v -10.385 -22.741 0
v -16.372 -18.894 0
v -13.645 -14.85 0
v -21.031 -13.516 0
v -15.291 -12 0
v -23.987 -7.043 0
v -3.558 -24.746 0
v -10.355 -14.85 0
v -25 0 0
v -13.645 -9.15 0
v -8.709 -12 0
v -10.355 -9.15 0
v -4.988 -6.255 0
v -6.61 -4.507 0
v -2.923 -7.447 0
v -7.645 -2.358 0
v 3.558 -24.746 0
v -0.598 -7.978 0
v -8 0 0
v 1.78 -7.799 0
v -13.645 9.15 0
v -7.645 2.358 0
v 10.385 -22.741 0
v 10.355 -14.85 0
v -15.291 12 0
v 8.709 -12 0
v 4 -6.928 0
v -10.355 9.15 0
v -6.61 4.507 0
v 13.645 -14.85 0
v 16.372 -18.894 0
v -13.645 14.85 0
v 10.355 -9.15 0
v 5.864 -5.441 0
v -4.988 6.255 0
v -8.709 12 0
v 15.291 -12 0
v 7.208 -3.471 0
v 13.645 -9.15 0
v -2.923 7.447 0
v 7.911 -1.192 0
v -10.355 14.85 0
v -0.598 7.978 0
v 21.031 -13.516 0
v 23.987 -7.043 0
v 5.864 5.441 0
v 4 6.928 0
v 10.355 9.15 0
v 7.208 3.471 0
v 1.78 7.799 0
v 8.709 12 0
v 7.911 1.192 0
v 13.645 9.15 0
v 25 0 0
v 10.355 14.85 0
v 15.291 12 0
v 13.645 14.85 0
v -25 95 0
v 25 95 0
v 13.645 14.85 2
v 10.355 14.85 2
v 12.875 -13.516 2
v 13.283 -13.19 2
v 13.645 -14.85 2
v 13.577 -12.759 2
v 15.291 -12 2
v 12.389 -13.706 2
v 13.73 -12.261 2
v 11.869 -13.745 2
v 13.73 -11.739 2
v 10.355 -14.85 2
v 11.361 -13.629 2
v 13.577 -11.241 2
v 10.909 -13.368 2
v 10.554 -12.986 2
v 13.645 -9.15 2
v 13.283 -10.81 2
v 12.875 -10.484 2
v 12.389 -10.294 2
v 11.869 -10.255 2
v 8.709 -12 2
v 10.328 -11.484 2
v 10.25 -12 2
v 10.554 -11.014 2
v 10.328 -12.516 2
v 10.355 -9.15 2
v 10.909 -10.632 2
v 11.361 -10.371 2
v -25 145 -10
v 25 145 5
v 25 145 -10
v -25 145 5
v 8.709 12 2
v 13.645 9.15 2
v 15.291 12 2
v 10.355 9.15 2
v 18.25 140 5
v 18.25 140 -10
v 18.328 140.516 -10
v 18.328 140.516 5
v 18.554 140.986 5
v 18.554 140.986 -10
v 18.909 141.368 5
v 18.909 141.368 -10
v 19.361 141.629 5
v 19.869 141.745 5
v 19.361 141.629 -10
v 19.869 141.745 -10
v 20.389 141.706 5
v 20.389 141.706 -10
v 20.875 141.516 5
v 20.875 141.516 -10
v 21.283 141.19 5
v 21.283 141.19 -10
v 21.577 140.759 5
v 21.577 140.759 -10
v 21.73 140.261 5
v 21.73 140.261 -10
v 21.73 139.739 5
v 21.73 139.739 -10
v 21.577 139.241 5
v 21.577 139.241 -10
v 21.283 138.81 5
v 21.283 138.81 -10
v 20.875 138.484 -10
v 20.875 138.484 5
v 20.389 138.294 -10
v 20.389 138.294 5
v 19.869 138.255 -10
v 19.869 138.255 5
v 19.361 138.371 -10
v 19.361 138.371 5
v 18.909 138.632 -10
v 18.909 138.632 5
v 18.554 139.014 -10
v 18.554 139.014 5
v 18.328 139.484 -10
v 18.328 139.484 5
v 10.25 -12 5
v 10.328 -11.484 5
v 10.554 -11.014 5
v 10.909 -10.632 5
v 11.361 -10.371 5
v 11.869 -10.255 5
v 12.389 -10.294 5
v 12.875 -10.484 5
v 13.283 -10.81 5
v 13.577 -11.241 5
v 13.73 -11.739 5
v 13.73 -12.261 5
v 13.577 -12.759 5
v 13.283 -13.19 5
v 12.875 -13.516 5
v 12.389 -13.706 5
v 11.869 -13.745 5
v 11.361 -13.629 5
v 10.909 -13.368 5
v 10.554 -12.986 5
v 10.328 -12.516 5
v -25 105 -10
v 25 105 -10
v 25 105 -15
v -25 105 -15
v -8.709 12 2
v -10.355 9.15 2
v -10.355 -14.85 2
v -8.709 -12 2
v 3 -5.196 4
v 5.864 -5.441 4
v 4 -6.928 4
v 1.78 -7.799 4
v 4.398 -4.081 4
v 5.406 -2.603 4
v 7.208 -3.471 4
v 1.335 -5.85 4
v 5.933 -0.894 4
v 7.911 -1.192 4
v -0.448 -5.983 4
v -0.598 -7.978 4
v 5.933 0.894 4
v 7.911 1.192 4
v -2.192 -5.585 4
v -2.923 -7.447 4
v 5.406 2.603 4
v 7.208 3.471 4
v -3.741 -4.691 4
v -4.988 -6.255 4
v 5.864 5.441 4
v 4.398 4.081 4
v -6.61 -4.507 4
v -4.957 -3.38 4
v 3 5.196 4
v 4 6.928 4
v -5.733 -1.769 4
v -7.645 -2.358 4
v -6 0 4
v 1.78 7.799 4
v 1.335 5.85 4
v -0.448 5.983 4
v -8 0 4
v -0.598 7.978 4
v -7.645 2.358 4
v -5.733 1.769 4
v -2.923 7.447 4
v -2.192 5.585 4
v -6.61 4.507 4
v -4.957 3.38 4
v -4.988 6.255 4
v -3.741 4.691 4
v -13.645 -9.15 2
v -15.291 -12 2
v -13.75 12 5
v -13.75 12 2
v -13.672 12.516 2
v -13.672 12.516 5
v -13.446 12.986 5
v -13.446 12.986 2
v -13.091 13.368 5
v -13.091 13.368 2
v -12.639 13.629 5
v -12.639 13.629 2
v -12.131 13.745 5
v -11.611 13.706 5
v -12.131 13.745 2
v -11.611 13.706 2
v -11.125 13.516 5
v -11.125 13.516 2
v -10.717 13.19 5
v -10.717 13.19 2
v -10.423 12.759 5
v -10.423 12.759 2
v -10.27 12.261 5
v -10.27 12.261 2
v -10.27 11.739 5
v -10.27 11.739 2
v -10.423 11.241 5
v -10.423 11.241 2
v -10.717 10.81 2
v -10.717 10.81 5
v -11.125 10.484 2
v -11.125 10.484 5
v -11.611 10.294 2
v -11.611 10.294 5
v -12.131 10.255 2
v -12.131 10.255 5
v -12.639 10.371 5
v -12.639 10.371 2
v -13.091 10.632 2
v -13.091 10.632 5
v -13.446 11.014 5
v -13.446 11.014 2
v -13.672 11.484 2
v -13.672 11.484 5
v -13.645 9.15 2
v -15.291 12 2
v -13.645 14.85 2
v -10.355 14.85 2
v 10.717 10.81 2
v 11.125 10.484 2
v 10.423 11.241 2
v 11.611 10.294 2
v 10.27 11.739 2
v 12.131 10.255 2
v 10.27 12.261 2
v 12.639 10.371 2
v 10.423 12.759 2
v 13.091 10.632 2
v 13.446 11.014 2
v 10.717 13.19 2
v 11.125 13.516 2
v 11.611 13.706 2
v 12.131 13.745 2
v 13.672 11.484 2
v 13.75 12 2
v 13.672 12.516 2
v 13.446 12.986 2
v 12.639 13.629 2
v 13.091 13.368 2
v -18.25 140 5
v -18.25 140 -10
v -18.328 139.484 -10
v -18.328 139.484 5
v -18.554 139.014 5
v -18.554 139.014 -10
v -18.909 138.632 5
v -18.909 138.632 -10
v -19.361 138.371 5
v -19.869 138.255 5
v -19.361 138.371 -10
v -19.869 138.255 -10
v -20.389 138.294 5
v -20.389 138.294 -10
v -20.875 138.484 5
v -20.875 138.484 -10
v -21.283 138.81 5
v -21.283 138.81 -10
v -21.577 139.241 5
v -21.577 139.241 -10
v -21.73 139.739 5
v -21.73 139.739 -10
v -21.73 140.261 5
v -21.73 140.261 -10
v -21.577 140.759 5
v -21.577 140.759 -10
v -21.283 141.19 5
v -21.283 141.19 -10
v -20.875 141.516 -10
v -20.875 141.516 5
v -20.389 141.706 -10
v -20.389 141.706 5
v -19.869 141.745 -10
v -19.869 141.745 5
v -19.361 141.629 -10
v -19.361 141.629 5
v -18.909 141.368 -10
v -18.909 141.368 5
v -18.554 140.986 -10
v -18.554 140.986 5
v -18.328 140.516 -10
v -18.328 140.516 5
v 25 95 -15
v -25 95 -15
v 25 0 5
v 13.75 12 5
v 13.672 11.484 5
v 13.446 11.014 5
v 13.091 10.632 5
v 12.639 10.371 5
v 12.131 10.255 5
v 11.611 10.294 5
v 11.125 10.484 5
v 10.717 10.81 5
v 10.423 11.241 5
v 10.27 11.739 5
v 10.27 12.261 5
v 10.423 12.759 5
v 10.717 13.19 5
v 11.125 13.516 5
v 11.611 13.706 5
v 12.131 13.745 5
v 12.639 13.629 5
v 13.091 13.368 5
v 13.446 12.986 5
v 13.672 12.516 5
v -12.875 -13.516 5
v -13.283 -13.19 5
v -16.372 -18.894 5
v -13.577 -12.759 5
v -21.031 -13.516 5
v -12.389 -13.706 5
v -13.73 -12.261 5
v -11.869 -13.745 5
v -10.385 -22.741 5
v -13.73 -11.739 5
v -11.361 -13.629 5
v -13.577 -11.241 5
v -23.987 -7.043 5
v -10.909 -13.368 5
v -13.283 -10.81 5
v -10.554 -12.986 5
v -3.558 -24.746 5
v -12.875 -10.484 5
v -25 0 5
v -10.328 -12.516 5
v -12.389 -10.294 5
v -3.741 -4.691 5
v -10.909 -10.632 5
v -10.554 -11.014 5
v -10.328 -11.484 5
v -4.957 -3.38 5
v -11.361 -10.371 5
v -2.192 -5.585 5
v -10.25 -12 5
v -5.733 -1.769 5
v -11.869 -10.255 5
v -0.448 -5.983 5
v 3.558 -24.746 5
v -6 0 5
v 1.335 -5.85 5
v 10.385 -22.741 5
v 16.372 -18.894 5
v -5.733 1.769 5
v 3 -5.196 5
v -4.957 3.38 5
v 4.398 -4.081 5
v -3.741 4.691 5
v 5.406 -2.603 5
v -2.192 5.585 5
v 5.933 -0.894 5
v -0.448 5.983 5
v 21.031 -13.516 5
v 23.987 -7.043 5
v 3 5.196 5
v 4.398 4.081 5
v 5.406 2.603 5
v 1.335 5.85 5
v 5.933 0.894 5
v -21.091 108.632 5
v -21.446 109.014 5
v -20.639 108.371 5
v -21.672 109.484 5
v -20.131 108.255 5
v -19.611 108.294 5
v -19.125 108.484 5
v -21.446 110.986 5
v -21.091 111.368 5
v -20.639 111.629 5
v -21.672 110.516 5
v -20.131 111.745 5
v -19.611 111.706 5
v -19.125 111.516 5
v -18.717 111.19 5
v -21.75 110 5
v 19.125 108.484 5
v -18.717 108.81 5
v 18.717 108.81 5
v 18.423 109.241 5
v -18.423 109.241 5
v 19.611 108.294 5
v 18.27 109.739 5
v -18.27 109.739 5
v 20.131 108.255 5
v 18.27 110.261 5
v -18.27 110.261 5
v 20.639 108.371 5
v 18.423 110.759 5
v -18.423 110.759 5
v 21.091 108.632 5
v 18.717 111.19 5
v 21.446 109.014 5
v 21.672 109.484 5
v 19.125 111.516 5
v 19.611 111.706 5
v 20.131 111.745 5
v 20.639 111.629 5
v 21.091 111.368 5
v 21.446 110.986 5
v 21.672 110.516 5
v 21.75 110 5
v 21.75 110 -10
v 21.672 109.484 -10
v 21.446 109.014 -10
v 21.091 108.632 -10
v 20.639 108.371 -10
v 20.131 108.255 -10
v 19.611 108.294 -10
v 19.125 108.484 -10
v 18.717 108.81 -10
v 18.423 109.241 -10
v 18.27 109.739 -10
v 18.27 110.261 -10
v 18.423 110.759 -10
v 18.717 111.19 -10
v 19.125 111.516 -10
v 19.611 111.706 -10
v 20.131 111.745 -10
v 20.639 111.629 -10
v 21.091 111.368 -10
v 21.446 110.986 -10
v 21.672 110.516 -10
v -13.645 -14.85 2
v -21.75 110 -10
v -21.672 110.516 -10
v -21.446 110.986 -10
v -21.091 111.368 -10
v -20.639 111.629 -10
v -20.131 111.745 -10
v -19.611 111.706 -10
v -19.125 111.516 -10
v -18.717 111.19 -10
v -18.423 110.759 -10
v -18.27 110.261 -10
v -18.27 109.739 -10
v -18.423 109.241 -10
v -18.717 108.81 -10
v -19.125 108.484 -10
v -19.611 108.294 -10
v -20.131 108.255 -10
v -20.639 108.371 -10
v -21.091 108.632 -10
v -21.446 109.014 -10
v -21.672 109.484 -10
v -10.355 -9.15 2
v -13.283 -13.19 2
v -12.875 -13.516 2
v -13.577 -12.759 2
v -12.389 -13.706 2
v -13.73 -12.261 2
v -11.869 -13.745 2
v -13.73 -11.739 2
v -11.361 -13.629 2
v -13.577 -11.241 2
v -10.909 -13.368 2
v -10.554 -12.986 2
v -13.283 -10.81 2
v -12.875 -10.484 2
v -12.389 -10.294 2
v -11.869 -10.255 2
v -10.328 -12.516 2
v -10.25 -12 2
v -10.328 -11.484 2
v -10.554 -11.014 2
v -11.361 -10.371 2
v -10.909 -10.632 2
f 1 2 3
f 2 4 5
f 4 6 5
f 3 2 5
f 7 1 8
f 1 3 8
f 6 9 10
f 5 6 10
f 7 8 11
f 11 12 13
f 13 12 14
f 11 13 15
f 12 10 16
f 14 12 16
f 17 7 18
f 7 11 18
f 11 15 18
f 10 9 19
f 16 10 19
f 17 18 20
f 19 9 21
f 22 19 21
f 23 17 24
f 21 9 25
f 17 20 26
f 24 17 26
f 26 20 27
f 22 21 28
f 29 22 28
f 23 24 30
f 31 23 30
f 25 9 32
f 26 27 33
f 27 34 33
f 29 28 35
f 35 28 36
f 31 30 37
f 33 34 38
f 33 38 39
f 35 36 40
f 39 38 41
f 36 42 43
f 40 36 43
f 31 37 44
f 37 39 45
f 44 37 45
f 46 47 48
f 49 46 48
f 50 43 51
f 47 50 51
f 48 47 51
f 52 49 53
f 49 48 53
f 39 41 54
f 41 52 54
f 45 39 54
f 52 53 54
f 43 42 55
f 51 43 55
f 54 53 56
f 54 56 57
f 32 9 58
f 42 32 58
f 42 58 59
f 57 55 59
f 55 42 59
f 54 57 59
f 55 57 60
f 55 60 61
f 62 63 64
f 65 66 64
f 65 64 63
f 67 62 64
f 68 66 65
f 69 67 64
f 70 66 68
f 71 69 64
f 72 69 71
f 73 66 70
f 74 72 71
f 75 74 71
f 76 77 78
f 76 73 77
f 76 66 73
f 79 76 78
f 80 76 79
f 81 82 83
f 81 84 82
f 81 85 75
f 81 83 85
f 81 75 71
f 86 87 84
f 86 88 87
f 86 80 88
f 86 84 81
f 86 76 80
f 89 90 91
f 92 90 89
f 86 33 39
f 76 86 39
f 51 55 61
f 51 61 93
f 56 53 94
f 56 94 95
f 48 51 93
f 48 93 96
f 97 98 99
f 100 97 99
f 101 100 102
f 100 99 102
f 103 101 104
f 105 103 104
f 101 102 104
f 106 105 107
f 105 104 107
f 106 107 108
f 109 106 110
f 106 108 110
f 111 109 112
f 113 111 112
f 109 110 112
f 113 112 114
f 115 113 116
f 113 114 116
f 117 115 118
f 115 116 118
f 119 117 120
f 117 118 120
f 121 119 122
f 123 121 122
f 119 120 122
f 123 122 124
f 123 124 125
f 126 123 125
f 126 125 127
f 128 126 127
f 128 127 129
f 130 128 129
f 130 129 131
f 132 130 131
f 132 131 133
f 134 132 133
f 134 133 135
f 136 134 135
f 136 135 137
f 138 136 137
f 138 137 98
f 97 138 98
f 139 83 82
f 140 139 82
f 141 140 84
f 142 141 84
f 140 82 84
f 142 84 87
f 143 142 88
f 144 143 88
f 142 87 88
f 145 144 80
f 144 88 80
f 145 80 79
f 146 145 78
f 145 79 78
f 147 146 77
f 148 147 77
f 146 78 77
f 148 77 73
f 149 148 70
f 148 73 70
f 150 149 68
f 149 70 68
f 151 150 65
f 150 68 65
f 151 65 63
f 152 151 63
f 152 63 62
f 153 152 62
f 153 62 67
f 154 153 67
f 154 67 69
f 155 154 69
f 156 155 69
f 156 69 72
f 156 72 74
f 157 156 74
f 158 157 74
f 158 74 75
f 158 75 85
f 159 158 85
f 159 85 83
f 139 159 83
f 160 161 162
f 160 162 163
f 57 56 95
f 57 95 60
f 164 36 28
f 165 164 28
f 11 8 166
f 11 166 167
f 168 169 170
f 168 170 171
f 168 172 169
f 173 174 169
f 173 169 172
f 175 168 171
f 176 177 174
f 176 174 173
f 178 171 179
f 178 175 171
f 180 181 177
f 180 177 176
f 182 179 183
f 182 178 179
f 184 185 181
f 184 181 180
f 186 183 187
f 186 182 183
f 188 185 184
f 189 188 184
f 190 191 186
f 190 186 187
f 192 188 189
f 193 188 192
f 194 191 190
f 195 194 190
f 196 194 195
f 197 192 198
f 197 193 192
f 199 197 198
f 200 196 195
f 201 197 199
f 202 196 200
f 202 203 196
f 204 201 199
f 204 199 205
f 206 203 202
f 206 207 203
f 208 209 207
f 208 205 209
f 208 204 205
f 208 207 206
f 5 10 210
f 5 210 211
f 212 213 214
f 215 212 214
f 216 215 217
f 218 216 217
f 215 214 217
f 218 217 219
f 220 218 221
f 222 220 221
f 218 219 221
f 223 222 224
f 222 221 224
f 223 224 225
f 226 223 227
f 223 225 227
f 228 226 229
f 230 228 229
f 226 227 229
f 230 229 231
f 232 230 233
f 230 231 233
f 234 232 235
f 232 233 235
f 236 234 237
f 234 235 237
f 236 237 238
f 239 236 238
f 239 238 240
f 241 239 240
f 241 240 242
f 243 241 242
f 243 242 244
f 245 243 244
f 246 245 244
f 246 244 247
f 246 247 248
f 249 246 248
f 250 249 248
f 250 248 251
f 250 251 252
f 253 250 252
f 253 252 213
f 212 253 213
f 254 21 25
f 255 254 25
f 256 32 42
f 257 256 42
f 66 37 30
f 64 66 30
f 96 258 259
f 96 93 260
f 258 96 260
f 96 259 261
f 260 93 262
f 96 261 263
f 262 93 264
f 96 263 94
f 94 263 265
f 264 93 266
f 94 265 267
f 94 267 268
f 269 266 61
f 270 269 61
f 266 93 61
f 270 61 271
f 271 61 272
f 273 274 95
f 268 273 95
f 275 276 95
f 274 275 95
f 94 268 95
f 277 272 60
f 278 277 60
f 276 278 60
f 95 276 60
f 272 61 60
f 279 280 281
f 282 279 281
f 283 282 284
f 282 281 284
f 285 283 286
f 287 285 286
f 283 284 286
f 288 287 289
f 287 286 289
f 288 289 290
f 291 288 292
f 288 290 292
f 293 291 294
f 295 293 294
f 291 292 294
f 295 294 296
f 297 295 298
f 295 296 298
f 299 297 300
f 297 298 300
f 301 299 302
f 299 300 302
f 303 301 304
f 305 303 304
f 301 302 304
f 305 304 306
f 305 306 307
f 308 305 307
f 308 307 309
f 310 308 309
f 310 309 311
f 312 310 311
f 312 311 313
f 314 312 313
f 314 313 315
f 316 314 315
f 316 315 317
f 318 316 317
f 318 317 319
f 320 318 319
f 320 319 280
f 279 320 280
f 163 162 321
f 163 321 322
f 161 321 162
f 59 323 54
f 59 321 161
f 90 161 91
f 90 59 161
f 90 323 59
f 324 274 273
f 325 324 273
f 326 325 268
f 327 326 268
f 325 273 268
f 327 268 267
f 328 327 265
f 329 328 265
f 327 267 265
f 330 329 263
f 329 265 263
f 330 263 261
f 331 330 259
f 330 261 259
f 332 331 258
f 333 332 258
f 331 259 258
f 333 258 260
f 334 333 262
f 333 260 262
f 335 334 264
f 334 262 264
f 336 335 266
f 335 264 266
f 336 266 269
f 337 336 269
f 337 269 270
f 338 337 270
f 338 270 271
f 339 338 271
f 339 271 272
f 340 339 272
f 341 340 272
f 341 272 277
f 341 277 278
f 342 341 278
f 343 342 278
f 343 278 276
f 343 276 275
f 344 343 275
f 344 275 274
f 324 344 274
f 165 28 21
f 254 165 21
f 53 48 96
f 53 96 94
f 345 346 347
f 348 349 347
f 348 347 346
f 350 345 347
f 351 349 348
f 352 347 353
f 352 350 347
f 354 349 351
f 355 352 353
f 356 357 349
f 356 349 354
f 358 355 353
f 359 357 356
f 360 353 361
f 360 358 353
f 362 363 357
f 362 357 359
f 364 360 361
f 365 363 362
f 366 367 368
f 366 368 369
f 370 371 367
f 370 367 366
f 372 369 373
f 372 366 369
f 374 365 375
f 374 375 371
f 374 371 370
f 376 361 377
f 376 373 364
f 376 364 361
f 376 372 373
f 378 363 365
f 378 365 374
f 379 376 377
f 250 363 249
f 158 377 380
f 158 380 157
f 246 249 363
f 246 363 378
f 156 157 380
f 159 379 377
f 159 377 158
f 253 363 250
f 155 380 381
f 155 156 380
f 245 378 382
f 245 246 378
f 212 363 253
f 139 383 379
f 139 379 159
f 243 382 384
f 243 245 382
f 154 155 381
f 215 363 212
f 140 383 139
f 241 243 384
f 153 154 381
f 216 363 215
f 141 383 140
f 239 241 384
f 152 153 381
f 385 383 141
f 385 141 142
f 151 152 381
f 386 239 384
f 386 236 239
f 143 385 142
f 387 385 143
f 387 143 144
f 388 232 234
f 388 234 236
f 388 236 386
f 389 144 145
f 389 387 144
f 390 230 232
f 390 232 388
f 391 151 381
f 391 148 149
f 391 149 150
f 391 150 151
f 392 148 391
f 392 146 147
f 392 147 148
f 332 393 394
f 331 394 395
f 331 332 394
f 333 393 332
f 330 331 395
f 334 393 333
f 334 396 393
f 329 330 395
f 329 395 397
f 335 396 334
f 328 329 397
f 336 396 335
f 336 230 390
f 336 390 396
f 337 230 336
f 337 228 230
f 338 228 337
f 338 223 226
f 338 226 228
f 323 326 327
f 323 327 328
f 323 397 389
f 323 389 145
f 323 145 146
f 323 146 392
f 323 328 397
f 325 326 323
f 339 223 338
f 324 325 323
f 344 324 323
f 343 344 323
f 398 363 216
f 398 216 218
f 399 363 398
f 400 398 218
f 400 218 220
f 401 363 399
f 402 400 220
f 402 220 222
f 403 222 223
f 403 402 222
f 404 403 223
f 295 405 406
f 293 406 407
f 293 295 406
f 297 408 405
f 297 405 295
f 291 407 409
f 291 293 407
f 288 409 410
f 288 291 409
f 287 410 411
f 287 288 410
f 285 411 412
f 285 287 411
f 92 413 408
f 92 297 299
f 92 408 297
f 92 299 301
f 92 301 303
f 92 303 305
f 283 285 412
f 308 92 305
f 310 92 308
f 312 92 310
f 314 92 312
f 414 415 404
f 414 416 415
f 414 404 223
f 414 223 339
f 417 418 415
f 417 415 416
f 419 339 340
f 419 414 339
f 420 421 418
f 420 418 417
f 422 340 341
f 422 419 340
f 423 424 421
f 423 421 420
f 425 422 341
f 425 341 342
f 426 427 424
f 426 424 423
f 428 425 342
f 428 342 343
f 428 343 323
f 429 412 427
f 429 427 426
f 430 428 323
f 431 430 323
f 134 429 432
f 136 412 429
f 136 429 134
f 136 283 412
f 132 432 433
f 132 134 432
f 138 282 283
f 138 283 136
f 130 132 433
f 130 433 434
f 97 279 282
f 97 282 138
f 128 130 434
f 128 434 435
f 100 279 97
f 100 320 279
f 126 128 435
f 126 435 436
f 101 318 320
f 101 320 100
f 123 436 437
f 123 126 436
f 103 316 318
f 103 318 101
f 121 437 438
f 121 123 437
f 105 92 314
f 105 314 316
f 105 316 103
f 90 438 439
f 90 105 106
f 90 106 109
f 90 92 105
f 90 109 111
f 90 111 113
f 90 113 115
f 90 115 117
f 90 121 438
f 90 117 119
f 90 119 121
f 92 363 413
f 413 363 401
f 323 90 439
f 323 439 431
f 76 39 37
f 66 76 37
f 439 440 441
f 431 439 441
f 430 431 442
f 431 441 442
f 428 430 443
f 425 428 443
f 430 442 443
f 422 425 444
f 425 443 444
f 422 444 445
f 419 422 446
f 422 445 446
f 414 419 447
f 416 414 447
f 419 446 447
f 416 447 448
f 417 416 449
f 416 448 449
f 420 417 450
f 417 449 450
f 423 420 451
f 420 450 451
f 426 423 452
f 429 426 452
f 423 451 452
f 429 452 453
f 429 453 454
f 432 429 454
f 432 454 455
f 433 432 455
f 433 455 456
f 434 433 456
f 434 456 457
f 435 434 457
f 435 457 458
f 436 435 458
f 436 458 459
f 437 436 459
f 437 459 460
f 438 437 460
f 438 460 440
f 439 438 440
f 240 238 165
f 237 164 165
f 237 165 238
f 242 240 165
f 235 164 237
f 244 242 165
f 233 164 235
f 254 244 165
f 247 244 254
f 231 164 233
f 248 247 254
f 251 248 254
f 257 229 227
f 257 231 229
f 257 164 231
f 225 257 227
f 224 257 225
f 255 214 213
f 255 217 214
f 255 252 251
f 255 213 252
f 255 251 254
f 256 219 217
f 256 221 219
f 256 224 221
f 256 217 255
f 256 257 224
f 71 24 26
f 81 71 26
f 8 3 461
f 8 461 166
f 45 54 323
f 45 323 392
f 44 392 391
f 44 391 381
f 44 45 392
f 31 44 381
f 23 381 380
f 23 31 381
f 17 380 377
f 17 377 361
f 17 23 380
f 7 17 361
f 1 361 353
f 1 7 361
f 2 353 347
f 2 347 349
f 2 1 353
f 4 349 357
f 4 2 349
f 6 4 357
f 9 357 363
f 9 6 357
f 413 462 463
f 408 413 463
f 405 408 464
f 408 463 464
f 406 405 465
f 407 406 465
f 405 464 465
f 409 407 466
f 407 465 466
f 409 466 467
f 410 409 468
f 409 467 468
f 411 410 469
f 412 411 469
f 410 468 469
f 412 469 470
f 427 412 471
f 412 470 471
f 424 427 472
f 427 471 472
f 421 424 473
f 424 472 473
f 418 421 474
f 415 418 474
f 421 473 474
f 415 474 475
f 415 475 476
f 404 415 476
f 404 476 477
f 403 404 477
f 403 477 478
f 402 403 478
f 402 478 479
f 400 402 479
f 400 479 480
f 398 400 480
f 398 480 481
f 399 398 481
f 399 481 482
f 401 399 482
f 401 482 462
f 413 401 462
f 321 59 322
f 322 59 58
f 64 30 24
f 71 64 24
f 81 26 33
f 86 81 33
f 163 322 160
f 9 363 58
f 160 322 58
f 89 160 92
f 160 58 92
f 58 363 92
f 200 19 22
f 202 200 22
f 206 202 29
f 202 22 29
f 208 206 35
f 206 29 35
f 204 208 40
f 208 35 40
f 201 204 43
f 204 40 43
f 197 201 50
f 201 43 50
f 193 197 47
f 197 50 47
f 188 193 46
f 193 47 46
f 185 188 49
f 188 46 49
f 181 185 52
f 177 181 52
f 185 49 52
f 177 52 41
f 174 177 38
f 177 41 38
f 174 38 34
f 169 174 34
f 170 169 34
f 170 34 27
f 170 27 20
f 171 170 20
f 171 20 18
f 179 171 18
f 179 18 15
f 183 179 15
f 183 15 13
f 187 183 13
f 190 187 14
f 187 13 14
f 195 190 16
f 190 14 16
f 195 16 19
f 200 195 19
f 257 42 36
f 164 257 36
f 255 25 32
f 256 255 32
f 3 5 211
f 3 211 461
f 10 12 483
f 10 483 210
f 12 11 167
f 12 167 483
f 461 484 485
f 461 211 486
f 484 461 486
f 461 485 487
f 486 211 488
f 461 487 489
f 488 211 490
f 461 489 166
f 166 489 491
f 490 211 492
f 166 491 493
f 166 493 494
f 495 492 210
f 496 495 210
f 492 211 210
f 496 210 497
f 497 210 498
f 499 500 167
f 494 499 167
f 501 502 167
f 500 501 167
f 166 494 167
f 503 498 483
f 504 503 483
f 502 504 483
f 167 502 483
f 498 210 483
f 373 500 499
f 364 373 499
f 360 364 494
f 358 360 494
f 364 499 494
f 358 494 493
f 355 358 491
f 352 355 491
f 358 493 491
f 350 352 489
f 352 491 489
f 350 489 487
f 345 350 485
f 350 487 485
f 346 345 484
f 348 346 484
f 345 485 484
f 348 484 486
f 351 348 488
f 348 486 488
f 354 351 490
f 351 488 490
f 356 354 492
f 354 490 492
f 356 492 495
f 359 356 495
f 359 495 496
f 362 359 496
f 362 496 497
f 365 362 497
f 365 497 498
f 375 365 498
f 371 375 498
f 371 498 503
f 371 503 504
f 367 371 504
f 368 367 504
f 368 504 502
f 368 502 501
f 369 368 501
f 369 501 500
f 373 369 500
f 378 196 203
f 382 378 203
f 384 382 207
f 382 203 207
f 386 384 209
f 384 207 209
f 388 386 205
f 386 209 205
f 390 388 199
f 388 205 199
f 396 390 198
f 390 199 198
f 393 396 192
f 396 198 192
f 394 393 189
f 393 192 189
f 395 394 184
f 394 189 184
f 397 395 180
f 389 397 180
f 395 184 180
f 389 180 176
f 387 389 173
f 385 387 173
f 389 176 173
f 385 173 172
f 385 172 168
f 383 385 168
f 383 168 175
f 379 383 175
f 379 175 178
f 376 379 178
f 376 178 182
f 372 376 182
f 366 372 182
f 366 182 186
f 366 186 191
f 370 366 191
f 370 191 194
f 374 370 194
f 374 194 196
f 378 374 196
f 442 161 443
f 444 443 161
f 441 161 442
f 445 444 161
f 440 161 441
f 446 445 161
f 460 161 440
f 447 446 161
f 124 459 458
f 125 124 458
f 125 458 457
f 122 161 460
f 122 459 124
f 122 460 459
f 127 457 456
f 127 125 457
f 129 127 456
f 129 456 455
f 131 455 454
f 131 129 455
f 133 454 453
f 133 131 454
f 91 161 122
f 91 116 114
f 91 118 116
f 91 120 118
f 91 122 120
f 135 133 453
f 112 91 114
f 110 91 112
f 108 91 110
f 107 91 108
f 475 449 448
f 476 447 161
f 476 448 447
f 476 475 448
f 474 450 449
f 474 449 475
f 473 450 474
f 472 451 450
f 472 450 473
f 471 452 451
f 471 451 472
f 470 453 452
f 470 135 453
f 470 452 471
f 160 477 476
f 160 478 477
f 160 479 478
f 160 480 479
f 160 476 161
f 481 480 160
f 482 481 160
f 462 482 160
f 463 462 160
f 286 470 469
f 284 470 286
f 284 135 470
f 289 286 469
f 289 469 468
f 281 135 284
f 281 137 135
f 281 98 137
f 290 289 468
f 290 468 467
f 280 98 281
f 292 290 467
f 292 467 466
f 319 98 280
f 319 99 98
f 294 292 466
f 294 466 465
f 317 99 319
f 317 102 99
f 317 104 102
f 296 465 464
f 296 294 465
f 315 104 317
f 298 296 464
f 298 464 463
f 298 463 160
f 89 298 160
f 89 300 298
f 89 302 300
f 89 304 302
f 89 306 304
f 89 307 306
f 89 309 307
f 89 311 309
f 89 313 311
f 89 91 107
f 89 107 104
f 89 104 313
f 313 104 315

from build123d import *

# Parameters (mm, degrees)
BOSS_EXTRUDE1_DEPTH = 5
SKETCH3_R           = 6
CUT_EXTRUDE2_DEPTH  = 36.707142143
SKETCH4_R           = 8
CUT_EXTRUDE3_DEPTH  = 4
SKETCH5_W           = 50
SKETCH5_H           = 120
BOSS_EXTRUDE2_DEPTH = 5
SKETCH6_R           = 1.75
CUT_EXTRUDE4_DEPTH  = 148.224318643
CUT_EXTRUDE5_DEPTH  = 2
SKETCH9_W           = 50
SKETCH9_H           = 40
BOSS_EXTRUDE3_DEPTH = 10
SKETCH10_W          = 50
SKETCH10_H          = 10
BOSS_EXTRUDE4_DEPTH = 15
SKETCH11_R          = 1.75
CUT_EXTRUDE6_DEPTH  = 148.901994577


with BuildPart() as part:
    # Sketch1 → Boss-Extrude1 (new body)
    with BuildSketch(Plane.XY):
        with BuildLine():
            Line((-25, 0), (-25, 25))
            Line((-25, 25), (25, 25))
            Line((25, 25), (25, 0))
            ThreePointArc((25, 0), (0, -25), (-25, 0))
        make_face()
    extrude(amount=BOSS_EXTRUDE1_DEPTH)

    # Sketch3 → Cut-Extrude2 (cut, through all)
    with BuildSketch(Plane(origin=(0, 0, 0), x_dir=(-1, 0, 0), z_dir=(0, 0, -1))):
        Circle(SKETCH3_R)
    extrude(amount=-CUT_EXTRUDE2_DEPTH, mode=Mode.SUBTRACT)

    # Sketch4 → Cut-Extrude3 (cut)
    with BuildSketch(Plane(origin=(0, 0, 0), x_dir=(-1, 0, 0), z_dir=(0, 0, -1))):
        Circle(SKETCH4_R)
    extrude(amount=-CUT_EXTRUDE3_DEPTH, mode=Mode.SUBTRACT)

    # Sketch5 → Boss-Extrude2 (add)
    with BuildSketch(Plane.XY):
        with Locations((0, 85)):
            Rectangle(SKETCH5_W, SKETCH5_H)
    extrude(amount=BOSS_EXTRUDE2_DEPTH)

    # Sketch6 → Cut-Extrude4 (cut, through all)
    with BuildSketch(Plane(origin=(0, 0, 0), x_dir=(-1, 0, 0), z_dir=(0, 0, -1))):
        with Locations((-12, -12)):
            Circle(SKETCH6_R)
        with Locations(Location((12, -12, 0), (0, 0, 180))):
            Circle(SKETCH6_R)
        with Locations((12, 12)):
            Circle(SKETCH6_R)
        with Locations(Location((-12, 12, 0), (0, 0, 180))):
            Circle(SKETCH6_R)
    extrude(amount=-CUT_EXTRUDE4_DEPTH, mode=Mode.SUBTRACT)

    # Sketch7 → Cut-Extrude5 (cut)
    with BuildSketch(Plane(origin=(0, 0, 0), x_dir=(-1, 0, 0), z_dir=(0, 0, -1))):
        Polygon((-8.709103466, -12), (-10.354551733, -9.15), (-13.645448267, -9.15), (-15.290896534, -12), (-13.645448267, -14.85), (-10.354551733, -14.85), align=None)
        Polygon((10.354551733, -14.85), (8.709103466, -12), (10.354551733, -9.15), (13.645448267, -9.15), (15.290896534, -12), (13.645448267, -14.85), align=None)
        Polygon((8.709103466, 12), (10.354551733, 9.15), (13.645448267, 9.15), (15.290896534, 12), (13.645448267, 14.85), (10.354551733, 14.85), align=None)
        Polygon((-10.354551733, 14.85), (-8.709103466, 12), (-10.354551733, 9.15), (-13.645448267, 9.15), (-15.290896534, 12), (-13.645448267, 14.85), align=None)
    extrude(amount=-CUT_EXTRUDE5_DEPTH, mode=Mode.SUBTRACT)

    # Sketch9 → Boss-Extrude3 (add)
    with BuildSketch(Plane(origin=(0, 0, 0), x_dir=(-1, 0, 0), z_dir=(0, 0, -1))):
        with Locations((0, 125)):
            Rectangle(SKETCH9_W, SKETCH9_H)
    extrude(amount=BOSS_EXTRUDE3_DEPTH)

    # Sketch10 → Boss-Extrude4 (add)
    with BuildSketch(Plane(origin=(0, 0, 0), x_dir=(-1, 0, 0), z_dir=(0, 0, -1))):
        with Locations((0, 100)):
            Rectangle(SKETCH10_W, SKETCH10_H)
    extrude(amount=BOSS_EXTRUDE4_DEPTH)

    # Sketch11 → Cut-Extrude6 (cut, through all)
    with BuildSketch(Plane(origin=(0, 0, -10), x_dir=(-1, 0, 0), z_dir=(0, 0, -1))):
        with Locations((-20, 140)):
            Circle(SKETCH11_R)
        with Locations(Location((20, 140, 0), (0, 0, 180))):
            Circle(SKETCH11_R)
        with Locations((20, 110)):
            Circle(SKETCH11_R)
        with Locations(Location((-20, 110, 0), (0, 0, 180))):
            Circle(SKETCH11_R)
    extrude(amount=-CUT_EXTRUDE6_DEPTH, mode=Mode.SUBTRACT)


solid = part.part
